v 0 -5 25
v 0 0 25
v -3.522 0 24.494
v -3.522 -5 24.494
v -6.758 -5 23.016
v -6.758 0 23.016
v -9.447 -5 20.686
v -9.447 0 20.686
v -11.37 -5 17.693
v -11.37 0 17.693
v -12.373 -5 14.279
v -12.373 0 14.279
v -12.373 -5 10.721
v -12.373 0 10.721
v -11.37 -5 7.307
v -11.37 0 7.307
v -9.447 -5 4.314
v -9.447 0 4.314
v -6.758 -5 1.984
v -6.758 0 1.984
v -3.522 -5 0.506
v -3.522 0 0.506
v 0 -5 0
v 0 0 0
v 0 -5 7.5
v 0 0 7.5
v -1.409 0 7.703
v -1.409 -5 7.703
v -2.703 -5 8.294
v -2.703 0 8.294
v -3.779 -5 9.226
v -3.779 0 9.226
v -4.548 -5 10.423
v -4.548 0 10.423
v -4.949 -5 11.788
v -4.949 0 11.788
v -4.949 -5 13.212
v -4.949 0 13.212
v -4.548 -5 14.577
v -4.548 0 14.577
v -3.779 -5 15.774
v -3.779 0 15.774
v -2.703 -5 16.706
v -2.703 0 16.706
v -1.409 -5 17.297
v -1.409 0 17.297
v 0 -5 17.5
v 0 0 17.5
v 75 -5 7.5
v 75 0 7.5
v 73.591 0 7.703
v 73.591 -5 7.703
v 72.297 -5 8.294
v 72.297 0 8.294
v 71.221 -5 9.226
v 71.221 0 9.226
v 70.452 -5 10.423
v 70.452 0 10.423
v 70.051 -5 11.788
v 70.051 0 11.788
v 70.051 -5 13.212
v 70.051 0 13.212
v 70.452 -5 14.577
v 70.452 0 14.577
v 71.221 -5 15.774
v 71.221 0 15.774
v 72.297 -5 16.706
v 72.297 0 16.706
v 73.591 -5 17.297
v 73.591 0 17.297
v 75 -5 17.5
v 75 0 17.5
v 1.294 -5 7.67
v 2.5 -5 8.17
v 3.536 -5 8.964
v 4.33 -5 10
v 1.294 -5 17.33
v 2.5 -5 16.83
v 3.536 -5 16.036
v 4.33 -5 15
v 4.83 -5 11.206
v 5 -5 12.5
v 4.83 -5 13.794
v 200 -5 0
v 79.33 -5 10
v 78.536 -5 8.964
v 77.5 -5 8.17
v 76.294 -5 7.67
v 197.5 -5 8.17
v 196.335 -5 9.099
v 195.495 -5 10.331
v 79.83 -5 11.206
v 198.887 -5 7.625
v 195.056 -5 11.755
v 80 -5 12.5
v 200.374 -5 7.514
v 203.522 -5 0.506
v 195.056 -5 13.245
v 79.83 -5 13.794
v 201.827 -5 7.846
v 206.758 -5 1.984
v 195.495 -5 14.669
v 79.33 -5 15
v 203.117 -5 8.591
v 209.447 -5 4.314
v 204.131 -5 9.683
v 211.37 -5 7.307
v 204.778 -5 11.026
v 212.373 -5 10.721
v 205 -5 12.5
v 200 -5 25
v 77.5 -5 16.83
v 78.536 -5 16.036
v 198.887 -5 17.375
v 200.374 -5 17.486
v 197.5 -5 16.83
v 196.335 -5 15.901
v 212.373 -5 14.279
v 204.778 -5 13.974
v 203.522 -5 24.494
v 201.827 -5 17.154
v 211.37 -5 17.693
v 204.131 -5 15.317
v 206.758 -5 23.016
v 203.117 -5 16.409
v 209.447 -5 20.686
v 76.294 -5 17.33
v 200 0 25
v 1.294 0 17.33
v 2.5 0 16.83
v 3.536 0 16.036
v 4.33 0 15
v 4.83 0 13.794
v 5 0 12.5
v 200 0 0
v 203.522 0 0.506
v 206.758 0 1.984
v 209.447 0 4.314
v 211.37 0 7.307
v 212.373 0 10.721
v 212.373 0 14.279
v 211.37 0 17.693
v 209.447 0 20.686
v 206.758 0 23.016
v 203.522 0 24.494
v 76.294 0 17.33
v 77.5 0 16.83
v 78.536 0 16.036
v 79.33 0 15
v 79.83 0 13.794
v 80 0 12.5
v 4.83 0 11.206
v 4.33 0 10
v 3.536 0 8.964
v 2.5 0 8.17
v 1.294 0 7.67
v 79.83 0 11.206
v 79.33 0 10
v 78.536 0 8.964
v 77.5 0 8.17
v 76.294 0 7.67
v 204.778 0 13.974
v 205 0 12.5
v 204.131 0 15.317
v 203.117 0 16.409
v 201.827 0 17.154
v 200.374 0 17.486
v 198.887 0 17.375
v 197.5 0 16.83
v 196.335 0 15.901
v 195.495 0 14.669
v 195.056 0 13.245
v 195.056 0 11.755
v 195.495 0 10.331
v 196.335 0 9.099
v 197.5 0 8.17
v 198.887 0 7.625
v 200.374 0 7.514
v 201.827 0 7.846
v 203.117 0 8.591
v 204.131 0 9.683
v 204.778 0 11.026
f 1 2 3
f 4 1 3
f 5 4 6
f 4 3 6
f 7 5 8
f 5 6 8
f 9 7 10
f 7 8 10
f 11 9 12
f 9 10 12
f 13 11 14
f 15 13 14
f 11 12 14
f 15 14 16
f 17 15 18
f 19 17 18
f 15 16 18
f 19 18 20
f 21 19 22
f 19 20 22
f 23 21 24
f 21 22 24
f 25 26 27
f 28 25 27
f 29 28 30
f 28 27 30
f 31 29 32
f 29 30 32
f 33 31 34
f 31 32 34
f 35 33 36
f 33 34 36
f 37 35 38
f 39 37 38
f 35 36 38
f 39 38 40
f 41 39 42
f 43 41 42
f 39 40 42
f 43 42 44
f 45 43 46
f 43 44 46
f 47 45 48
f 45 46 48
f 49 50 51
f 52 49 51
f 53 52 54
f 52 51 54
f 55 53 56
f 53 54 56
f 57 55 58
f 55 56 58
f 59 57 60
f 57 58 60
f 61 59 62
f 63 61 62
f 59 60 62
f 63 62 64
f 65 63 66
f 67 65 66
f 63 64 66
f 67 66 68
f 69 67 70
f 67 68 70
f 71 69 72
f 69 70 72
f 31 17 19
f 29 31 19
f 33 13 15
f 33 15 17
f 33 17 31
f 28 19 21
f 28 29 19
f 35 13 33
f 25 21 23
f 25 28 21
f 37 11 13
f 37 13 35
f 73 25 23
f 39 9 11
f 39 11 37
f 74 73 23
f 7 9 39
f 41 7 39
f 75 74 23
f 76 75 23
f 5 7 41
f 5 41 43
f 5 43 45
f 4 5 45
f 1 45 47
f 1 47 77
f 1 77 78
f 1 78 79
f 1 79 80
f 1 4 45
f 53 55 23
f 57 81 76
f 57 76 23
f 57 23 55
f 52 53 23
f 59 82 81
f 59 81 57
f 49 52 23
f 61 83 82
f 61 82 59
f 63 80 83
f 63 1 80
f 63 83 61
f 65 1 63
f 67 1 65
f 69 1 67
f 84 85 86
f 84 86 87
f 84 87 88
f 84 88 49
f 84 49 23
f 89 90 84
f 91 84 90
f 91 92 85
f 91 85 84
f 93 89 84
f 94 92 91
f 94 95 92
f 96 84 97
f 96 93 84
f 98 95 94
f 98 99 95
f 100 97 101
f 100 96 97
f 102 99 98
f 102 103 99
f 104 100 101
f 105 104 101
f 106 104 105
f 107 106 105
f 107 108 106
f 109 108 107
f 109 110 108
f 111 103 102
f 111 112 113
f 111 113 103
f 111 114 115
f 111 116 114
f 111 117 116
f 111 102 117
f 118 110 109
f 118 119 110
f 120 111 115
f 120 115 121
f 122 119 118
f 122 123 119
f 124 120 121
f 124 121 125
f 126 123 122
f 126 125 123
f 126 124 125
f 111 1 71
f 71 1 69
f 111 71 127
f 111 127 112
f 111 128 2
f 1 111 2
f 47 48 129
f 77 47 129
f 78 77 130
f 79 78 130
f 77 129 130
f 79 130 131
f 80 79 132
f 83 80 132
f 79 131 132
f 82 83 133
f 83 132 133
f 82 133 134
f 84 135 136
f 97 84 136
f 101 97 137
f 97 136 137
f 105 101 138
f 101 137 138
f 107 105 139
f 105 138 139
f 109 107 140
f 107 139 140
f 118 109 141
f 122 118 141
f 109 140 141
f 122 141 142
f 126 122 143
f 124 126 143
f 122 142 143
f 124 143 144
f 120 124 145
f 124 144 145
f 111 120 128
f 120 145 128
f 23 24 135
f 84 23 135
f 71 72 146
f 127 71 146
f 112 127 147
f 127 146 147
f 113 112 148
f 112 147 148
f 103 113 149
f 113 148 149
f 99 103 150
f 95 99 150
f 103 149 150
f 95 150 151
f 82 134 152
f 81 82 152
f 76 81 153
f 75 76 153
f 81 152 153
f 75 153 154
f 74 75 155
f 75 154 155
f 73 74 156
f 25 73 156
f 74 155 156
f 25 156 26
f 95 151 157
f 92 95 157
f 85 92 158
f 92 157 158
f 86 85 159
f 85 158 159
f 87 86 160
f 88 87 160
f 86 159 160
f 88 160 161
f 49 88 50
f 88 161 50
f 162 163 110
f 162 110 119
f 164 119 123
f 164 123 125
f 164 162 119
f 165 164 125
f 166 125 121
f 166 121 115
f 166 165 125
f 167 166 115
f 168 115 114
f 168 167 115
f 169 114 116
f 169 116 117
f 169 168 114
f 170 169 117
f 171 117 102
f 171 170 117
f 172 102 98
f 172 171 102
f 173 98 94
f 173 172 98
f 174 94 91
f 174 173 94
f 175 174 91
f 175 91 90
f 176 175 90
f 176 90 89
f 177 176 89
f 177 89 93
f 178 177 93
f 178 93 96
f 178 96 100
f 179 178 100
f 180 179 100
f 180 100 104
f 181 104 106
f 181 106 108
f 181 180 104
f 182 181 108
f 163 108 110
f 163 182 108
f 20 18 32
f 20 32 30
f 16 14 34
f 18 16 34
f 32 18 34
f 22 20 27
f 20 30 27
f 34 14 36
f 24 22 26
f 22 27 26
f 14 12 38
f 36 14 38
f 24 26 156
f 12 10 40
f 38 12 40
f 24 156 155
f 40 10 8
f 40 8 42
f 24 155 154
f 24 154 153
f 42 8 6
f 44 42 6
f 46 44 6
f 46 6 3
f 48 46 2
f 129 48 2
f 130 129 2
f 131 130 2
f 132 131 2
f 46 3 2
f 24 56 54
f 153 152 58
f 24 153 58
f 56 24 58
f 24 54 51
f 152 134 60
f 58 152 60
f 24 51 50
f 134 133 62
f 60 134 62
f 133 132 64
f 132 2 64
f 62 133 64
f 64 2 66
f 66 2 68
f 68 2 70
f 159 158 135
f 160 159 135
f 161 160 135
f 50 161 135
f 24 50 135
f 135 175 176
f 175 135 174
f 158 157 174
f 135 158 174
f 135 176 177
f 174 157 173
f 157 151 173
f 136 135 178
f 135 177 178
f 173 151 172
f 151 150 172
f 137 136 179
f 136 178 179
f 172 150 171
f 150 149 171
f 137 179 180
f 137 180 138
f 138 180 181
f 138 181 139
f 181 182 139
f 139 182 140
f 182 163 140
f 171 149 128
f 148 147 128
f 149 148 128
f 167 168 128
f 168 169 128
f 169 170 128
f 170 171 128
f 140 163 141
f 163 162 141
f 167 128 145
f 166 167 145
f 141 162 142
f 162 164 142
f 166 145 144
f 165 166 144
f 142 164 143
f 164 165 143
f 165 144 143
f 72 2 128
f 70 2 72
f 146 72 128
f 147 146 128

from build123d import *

# Parameters (mm, degrees)
F0_R     = 5
F1_DEPTH = 5


with BuildPart() as f1:
    # F0 (on Front) → F1 (new body)
    with BuildSketch(Plane.XZ):
        with BuildLine():
            ThreePointArc((0, 25), (-12.5, 12.5), (0, 0))
            Line((0, 0), (200, 0))
            ThreePointArc((200, 0), (212.5, 12.5), (200, 25))
            Line((200, 25), (0, 25))
        make_face()
        with BuildLine():
            ThreePointArc((0, 7.5), (-5, 12.5), (0, 17.5))
            ThreePointArc((0, 17.5), (3.535534, 16.035534), (5, 12.5))
            ThreePointArc((5, 12.5), (3.535534, 8.964466), (0, 7.5))
        make_face(mode=Mode.SUBTRACT)
        with BuildLine():
            ThreePointArc((80, 12.5), (78.535534, 8.964466), (75, 7.5))
            ThreePointArc((75, 7.5), (70, 12.5), (75, 17.5))
            ThreePointArc((75, 17.5), (78.535534, 16.035534), (80, 12.5))
        make_face(mode=Mode.SUBTRACT)
        with Locations((200, 12.5)):
            Circle(F0_R, mode=Mode.SUBTRACT)
    extrude(amount=F1_DEPTH)


solid = f1.part
